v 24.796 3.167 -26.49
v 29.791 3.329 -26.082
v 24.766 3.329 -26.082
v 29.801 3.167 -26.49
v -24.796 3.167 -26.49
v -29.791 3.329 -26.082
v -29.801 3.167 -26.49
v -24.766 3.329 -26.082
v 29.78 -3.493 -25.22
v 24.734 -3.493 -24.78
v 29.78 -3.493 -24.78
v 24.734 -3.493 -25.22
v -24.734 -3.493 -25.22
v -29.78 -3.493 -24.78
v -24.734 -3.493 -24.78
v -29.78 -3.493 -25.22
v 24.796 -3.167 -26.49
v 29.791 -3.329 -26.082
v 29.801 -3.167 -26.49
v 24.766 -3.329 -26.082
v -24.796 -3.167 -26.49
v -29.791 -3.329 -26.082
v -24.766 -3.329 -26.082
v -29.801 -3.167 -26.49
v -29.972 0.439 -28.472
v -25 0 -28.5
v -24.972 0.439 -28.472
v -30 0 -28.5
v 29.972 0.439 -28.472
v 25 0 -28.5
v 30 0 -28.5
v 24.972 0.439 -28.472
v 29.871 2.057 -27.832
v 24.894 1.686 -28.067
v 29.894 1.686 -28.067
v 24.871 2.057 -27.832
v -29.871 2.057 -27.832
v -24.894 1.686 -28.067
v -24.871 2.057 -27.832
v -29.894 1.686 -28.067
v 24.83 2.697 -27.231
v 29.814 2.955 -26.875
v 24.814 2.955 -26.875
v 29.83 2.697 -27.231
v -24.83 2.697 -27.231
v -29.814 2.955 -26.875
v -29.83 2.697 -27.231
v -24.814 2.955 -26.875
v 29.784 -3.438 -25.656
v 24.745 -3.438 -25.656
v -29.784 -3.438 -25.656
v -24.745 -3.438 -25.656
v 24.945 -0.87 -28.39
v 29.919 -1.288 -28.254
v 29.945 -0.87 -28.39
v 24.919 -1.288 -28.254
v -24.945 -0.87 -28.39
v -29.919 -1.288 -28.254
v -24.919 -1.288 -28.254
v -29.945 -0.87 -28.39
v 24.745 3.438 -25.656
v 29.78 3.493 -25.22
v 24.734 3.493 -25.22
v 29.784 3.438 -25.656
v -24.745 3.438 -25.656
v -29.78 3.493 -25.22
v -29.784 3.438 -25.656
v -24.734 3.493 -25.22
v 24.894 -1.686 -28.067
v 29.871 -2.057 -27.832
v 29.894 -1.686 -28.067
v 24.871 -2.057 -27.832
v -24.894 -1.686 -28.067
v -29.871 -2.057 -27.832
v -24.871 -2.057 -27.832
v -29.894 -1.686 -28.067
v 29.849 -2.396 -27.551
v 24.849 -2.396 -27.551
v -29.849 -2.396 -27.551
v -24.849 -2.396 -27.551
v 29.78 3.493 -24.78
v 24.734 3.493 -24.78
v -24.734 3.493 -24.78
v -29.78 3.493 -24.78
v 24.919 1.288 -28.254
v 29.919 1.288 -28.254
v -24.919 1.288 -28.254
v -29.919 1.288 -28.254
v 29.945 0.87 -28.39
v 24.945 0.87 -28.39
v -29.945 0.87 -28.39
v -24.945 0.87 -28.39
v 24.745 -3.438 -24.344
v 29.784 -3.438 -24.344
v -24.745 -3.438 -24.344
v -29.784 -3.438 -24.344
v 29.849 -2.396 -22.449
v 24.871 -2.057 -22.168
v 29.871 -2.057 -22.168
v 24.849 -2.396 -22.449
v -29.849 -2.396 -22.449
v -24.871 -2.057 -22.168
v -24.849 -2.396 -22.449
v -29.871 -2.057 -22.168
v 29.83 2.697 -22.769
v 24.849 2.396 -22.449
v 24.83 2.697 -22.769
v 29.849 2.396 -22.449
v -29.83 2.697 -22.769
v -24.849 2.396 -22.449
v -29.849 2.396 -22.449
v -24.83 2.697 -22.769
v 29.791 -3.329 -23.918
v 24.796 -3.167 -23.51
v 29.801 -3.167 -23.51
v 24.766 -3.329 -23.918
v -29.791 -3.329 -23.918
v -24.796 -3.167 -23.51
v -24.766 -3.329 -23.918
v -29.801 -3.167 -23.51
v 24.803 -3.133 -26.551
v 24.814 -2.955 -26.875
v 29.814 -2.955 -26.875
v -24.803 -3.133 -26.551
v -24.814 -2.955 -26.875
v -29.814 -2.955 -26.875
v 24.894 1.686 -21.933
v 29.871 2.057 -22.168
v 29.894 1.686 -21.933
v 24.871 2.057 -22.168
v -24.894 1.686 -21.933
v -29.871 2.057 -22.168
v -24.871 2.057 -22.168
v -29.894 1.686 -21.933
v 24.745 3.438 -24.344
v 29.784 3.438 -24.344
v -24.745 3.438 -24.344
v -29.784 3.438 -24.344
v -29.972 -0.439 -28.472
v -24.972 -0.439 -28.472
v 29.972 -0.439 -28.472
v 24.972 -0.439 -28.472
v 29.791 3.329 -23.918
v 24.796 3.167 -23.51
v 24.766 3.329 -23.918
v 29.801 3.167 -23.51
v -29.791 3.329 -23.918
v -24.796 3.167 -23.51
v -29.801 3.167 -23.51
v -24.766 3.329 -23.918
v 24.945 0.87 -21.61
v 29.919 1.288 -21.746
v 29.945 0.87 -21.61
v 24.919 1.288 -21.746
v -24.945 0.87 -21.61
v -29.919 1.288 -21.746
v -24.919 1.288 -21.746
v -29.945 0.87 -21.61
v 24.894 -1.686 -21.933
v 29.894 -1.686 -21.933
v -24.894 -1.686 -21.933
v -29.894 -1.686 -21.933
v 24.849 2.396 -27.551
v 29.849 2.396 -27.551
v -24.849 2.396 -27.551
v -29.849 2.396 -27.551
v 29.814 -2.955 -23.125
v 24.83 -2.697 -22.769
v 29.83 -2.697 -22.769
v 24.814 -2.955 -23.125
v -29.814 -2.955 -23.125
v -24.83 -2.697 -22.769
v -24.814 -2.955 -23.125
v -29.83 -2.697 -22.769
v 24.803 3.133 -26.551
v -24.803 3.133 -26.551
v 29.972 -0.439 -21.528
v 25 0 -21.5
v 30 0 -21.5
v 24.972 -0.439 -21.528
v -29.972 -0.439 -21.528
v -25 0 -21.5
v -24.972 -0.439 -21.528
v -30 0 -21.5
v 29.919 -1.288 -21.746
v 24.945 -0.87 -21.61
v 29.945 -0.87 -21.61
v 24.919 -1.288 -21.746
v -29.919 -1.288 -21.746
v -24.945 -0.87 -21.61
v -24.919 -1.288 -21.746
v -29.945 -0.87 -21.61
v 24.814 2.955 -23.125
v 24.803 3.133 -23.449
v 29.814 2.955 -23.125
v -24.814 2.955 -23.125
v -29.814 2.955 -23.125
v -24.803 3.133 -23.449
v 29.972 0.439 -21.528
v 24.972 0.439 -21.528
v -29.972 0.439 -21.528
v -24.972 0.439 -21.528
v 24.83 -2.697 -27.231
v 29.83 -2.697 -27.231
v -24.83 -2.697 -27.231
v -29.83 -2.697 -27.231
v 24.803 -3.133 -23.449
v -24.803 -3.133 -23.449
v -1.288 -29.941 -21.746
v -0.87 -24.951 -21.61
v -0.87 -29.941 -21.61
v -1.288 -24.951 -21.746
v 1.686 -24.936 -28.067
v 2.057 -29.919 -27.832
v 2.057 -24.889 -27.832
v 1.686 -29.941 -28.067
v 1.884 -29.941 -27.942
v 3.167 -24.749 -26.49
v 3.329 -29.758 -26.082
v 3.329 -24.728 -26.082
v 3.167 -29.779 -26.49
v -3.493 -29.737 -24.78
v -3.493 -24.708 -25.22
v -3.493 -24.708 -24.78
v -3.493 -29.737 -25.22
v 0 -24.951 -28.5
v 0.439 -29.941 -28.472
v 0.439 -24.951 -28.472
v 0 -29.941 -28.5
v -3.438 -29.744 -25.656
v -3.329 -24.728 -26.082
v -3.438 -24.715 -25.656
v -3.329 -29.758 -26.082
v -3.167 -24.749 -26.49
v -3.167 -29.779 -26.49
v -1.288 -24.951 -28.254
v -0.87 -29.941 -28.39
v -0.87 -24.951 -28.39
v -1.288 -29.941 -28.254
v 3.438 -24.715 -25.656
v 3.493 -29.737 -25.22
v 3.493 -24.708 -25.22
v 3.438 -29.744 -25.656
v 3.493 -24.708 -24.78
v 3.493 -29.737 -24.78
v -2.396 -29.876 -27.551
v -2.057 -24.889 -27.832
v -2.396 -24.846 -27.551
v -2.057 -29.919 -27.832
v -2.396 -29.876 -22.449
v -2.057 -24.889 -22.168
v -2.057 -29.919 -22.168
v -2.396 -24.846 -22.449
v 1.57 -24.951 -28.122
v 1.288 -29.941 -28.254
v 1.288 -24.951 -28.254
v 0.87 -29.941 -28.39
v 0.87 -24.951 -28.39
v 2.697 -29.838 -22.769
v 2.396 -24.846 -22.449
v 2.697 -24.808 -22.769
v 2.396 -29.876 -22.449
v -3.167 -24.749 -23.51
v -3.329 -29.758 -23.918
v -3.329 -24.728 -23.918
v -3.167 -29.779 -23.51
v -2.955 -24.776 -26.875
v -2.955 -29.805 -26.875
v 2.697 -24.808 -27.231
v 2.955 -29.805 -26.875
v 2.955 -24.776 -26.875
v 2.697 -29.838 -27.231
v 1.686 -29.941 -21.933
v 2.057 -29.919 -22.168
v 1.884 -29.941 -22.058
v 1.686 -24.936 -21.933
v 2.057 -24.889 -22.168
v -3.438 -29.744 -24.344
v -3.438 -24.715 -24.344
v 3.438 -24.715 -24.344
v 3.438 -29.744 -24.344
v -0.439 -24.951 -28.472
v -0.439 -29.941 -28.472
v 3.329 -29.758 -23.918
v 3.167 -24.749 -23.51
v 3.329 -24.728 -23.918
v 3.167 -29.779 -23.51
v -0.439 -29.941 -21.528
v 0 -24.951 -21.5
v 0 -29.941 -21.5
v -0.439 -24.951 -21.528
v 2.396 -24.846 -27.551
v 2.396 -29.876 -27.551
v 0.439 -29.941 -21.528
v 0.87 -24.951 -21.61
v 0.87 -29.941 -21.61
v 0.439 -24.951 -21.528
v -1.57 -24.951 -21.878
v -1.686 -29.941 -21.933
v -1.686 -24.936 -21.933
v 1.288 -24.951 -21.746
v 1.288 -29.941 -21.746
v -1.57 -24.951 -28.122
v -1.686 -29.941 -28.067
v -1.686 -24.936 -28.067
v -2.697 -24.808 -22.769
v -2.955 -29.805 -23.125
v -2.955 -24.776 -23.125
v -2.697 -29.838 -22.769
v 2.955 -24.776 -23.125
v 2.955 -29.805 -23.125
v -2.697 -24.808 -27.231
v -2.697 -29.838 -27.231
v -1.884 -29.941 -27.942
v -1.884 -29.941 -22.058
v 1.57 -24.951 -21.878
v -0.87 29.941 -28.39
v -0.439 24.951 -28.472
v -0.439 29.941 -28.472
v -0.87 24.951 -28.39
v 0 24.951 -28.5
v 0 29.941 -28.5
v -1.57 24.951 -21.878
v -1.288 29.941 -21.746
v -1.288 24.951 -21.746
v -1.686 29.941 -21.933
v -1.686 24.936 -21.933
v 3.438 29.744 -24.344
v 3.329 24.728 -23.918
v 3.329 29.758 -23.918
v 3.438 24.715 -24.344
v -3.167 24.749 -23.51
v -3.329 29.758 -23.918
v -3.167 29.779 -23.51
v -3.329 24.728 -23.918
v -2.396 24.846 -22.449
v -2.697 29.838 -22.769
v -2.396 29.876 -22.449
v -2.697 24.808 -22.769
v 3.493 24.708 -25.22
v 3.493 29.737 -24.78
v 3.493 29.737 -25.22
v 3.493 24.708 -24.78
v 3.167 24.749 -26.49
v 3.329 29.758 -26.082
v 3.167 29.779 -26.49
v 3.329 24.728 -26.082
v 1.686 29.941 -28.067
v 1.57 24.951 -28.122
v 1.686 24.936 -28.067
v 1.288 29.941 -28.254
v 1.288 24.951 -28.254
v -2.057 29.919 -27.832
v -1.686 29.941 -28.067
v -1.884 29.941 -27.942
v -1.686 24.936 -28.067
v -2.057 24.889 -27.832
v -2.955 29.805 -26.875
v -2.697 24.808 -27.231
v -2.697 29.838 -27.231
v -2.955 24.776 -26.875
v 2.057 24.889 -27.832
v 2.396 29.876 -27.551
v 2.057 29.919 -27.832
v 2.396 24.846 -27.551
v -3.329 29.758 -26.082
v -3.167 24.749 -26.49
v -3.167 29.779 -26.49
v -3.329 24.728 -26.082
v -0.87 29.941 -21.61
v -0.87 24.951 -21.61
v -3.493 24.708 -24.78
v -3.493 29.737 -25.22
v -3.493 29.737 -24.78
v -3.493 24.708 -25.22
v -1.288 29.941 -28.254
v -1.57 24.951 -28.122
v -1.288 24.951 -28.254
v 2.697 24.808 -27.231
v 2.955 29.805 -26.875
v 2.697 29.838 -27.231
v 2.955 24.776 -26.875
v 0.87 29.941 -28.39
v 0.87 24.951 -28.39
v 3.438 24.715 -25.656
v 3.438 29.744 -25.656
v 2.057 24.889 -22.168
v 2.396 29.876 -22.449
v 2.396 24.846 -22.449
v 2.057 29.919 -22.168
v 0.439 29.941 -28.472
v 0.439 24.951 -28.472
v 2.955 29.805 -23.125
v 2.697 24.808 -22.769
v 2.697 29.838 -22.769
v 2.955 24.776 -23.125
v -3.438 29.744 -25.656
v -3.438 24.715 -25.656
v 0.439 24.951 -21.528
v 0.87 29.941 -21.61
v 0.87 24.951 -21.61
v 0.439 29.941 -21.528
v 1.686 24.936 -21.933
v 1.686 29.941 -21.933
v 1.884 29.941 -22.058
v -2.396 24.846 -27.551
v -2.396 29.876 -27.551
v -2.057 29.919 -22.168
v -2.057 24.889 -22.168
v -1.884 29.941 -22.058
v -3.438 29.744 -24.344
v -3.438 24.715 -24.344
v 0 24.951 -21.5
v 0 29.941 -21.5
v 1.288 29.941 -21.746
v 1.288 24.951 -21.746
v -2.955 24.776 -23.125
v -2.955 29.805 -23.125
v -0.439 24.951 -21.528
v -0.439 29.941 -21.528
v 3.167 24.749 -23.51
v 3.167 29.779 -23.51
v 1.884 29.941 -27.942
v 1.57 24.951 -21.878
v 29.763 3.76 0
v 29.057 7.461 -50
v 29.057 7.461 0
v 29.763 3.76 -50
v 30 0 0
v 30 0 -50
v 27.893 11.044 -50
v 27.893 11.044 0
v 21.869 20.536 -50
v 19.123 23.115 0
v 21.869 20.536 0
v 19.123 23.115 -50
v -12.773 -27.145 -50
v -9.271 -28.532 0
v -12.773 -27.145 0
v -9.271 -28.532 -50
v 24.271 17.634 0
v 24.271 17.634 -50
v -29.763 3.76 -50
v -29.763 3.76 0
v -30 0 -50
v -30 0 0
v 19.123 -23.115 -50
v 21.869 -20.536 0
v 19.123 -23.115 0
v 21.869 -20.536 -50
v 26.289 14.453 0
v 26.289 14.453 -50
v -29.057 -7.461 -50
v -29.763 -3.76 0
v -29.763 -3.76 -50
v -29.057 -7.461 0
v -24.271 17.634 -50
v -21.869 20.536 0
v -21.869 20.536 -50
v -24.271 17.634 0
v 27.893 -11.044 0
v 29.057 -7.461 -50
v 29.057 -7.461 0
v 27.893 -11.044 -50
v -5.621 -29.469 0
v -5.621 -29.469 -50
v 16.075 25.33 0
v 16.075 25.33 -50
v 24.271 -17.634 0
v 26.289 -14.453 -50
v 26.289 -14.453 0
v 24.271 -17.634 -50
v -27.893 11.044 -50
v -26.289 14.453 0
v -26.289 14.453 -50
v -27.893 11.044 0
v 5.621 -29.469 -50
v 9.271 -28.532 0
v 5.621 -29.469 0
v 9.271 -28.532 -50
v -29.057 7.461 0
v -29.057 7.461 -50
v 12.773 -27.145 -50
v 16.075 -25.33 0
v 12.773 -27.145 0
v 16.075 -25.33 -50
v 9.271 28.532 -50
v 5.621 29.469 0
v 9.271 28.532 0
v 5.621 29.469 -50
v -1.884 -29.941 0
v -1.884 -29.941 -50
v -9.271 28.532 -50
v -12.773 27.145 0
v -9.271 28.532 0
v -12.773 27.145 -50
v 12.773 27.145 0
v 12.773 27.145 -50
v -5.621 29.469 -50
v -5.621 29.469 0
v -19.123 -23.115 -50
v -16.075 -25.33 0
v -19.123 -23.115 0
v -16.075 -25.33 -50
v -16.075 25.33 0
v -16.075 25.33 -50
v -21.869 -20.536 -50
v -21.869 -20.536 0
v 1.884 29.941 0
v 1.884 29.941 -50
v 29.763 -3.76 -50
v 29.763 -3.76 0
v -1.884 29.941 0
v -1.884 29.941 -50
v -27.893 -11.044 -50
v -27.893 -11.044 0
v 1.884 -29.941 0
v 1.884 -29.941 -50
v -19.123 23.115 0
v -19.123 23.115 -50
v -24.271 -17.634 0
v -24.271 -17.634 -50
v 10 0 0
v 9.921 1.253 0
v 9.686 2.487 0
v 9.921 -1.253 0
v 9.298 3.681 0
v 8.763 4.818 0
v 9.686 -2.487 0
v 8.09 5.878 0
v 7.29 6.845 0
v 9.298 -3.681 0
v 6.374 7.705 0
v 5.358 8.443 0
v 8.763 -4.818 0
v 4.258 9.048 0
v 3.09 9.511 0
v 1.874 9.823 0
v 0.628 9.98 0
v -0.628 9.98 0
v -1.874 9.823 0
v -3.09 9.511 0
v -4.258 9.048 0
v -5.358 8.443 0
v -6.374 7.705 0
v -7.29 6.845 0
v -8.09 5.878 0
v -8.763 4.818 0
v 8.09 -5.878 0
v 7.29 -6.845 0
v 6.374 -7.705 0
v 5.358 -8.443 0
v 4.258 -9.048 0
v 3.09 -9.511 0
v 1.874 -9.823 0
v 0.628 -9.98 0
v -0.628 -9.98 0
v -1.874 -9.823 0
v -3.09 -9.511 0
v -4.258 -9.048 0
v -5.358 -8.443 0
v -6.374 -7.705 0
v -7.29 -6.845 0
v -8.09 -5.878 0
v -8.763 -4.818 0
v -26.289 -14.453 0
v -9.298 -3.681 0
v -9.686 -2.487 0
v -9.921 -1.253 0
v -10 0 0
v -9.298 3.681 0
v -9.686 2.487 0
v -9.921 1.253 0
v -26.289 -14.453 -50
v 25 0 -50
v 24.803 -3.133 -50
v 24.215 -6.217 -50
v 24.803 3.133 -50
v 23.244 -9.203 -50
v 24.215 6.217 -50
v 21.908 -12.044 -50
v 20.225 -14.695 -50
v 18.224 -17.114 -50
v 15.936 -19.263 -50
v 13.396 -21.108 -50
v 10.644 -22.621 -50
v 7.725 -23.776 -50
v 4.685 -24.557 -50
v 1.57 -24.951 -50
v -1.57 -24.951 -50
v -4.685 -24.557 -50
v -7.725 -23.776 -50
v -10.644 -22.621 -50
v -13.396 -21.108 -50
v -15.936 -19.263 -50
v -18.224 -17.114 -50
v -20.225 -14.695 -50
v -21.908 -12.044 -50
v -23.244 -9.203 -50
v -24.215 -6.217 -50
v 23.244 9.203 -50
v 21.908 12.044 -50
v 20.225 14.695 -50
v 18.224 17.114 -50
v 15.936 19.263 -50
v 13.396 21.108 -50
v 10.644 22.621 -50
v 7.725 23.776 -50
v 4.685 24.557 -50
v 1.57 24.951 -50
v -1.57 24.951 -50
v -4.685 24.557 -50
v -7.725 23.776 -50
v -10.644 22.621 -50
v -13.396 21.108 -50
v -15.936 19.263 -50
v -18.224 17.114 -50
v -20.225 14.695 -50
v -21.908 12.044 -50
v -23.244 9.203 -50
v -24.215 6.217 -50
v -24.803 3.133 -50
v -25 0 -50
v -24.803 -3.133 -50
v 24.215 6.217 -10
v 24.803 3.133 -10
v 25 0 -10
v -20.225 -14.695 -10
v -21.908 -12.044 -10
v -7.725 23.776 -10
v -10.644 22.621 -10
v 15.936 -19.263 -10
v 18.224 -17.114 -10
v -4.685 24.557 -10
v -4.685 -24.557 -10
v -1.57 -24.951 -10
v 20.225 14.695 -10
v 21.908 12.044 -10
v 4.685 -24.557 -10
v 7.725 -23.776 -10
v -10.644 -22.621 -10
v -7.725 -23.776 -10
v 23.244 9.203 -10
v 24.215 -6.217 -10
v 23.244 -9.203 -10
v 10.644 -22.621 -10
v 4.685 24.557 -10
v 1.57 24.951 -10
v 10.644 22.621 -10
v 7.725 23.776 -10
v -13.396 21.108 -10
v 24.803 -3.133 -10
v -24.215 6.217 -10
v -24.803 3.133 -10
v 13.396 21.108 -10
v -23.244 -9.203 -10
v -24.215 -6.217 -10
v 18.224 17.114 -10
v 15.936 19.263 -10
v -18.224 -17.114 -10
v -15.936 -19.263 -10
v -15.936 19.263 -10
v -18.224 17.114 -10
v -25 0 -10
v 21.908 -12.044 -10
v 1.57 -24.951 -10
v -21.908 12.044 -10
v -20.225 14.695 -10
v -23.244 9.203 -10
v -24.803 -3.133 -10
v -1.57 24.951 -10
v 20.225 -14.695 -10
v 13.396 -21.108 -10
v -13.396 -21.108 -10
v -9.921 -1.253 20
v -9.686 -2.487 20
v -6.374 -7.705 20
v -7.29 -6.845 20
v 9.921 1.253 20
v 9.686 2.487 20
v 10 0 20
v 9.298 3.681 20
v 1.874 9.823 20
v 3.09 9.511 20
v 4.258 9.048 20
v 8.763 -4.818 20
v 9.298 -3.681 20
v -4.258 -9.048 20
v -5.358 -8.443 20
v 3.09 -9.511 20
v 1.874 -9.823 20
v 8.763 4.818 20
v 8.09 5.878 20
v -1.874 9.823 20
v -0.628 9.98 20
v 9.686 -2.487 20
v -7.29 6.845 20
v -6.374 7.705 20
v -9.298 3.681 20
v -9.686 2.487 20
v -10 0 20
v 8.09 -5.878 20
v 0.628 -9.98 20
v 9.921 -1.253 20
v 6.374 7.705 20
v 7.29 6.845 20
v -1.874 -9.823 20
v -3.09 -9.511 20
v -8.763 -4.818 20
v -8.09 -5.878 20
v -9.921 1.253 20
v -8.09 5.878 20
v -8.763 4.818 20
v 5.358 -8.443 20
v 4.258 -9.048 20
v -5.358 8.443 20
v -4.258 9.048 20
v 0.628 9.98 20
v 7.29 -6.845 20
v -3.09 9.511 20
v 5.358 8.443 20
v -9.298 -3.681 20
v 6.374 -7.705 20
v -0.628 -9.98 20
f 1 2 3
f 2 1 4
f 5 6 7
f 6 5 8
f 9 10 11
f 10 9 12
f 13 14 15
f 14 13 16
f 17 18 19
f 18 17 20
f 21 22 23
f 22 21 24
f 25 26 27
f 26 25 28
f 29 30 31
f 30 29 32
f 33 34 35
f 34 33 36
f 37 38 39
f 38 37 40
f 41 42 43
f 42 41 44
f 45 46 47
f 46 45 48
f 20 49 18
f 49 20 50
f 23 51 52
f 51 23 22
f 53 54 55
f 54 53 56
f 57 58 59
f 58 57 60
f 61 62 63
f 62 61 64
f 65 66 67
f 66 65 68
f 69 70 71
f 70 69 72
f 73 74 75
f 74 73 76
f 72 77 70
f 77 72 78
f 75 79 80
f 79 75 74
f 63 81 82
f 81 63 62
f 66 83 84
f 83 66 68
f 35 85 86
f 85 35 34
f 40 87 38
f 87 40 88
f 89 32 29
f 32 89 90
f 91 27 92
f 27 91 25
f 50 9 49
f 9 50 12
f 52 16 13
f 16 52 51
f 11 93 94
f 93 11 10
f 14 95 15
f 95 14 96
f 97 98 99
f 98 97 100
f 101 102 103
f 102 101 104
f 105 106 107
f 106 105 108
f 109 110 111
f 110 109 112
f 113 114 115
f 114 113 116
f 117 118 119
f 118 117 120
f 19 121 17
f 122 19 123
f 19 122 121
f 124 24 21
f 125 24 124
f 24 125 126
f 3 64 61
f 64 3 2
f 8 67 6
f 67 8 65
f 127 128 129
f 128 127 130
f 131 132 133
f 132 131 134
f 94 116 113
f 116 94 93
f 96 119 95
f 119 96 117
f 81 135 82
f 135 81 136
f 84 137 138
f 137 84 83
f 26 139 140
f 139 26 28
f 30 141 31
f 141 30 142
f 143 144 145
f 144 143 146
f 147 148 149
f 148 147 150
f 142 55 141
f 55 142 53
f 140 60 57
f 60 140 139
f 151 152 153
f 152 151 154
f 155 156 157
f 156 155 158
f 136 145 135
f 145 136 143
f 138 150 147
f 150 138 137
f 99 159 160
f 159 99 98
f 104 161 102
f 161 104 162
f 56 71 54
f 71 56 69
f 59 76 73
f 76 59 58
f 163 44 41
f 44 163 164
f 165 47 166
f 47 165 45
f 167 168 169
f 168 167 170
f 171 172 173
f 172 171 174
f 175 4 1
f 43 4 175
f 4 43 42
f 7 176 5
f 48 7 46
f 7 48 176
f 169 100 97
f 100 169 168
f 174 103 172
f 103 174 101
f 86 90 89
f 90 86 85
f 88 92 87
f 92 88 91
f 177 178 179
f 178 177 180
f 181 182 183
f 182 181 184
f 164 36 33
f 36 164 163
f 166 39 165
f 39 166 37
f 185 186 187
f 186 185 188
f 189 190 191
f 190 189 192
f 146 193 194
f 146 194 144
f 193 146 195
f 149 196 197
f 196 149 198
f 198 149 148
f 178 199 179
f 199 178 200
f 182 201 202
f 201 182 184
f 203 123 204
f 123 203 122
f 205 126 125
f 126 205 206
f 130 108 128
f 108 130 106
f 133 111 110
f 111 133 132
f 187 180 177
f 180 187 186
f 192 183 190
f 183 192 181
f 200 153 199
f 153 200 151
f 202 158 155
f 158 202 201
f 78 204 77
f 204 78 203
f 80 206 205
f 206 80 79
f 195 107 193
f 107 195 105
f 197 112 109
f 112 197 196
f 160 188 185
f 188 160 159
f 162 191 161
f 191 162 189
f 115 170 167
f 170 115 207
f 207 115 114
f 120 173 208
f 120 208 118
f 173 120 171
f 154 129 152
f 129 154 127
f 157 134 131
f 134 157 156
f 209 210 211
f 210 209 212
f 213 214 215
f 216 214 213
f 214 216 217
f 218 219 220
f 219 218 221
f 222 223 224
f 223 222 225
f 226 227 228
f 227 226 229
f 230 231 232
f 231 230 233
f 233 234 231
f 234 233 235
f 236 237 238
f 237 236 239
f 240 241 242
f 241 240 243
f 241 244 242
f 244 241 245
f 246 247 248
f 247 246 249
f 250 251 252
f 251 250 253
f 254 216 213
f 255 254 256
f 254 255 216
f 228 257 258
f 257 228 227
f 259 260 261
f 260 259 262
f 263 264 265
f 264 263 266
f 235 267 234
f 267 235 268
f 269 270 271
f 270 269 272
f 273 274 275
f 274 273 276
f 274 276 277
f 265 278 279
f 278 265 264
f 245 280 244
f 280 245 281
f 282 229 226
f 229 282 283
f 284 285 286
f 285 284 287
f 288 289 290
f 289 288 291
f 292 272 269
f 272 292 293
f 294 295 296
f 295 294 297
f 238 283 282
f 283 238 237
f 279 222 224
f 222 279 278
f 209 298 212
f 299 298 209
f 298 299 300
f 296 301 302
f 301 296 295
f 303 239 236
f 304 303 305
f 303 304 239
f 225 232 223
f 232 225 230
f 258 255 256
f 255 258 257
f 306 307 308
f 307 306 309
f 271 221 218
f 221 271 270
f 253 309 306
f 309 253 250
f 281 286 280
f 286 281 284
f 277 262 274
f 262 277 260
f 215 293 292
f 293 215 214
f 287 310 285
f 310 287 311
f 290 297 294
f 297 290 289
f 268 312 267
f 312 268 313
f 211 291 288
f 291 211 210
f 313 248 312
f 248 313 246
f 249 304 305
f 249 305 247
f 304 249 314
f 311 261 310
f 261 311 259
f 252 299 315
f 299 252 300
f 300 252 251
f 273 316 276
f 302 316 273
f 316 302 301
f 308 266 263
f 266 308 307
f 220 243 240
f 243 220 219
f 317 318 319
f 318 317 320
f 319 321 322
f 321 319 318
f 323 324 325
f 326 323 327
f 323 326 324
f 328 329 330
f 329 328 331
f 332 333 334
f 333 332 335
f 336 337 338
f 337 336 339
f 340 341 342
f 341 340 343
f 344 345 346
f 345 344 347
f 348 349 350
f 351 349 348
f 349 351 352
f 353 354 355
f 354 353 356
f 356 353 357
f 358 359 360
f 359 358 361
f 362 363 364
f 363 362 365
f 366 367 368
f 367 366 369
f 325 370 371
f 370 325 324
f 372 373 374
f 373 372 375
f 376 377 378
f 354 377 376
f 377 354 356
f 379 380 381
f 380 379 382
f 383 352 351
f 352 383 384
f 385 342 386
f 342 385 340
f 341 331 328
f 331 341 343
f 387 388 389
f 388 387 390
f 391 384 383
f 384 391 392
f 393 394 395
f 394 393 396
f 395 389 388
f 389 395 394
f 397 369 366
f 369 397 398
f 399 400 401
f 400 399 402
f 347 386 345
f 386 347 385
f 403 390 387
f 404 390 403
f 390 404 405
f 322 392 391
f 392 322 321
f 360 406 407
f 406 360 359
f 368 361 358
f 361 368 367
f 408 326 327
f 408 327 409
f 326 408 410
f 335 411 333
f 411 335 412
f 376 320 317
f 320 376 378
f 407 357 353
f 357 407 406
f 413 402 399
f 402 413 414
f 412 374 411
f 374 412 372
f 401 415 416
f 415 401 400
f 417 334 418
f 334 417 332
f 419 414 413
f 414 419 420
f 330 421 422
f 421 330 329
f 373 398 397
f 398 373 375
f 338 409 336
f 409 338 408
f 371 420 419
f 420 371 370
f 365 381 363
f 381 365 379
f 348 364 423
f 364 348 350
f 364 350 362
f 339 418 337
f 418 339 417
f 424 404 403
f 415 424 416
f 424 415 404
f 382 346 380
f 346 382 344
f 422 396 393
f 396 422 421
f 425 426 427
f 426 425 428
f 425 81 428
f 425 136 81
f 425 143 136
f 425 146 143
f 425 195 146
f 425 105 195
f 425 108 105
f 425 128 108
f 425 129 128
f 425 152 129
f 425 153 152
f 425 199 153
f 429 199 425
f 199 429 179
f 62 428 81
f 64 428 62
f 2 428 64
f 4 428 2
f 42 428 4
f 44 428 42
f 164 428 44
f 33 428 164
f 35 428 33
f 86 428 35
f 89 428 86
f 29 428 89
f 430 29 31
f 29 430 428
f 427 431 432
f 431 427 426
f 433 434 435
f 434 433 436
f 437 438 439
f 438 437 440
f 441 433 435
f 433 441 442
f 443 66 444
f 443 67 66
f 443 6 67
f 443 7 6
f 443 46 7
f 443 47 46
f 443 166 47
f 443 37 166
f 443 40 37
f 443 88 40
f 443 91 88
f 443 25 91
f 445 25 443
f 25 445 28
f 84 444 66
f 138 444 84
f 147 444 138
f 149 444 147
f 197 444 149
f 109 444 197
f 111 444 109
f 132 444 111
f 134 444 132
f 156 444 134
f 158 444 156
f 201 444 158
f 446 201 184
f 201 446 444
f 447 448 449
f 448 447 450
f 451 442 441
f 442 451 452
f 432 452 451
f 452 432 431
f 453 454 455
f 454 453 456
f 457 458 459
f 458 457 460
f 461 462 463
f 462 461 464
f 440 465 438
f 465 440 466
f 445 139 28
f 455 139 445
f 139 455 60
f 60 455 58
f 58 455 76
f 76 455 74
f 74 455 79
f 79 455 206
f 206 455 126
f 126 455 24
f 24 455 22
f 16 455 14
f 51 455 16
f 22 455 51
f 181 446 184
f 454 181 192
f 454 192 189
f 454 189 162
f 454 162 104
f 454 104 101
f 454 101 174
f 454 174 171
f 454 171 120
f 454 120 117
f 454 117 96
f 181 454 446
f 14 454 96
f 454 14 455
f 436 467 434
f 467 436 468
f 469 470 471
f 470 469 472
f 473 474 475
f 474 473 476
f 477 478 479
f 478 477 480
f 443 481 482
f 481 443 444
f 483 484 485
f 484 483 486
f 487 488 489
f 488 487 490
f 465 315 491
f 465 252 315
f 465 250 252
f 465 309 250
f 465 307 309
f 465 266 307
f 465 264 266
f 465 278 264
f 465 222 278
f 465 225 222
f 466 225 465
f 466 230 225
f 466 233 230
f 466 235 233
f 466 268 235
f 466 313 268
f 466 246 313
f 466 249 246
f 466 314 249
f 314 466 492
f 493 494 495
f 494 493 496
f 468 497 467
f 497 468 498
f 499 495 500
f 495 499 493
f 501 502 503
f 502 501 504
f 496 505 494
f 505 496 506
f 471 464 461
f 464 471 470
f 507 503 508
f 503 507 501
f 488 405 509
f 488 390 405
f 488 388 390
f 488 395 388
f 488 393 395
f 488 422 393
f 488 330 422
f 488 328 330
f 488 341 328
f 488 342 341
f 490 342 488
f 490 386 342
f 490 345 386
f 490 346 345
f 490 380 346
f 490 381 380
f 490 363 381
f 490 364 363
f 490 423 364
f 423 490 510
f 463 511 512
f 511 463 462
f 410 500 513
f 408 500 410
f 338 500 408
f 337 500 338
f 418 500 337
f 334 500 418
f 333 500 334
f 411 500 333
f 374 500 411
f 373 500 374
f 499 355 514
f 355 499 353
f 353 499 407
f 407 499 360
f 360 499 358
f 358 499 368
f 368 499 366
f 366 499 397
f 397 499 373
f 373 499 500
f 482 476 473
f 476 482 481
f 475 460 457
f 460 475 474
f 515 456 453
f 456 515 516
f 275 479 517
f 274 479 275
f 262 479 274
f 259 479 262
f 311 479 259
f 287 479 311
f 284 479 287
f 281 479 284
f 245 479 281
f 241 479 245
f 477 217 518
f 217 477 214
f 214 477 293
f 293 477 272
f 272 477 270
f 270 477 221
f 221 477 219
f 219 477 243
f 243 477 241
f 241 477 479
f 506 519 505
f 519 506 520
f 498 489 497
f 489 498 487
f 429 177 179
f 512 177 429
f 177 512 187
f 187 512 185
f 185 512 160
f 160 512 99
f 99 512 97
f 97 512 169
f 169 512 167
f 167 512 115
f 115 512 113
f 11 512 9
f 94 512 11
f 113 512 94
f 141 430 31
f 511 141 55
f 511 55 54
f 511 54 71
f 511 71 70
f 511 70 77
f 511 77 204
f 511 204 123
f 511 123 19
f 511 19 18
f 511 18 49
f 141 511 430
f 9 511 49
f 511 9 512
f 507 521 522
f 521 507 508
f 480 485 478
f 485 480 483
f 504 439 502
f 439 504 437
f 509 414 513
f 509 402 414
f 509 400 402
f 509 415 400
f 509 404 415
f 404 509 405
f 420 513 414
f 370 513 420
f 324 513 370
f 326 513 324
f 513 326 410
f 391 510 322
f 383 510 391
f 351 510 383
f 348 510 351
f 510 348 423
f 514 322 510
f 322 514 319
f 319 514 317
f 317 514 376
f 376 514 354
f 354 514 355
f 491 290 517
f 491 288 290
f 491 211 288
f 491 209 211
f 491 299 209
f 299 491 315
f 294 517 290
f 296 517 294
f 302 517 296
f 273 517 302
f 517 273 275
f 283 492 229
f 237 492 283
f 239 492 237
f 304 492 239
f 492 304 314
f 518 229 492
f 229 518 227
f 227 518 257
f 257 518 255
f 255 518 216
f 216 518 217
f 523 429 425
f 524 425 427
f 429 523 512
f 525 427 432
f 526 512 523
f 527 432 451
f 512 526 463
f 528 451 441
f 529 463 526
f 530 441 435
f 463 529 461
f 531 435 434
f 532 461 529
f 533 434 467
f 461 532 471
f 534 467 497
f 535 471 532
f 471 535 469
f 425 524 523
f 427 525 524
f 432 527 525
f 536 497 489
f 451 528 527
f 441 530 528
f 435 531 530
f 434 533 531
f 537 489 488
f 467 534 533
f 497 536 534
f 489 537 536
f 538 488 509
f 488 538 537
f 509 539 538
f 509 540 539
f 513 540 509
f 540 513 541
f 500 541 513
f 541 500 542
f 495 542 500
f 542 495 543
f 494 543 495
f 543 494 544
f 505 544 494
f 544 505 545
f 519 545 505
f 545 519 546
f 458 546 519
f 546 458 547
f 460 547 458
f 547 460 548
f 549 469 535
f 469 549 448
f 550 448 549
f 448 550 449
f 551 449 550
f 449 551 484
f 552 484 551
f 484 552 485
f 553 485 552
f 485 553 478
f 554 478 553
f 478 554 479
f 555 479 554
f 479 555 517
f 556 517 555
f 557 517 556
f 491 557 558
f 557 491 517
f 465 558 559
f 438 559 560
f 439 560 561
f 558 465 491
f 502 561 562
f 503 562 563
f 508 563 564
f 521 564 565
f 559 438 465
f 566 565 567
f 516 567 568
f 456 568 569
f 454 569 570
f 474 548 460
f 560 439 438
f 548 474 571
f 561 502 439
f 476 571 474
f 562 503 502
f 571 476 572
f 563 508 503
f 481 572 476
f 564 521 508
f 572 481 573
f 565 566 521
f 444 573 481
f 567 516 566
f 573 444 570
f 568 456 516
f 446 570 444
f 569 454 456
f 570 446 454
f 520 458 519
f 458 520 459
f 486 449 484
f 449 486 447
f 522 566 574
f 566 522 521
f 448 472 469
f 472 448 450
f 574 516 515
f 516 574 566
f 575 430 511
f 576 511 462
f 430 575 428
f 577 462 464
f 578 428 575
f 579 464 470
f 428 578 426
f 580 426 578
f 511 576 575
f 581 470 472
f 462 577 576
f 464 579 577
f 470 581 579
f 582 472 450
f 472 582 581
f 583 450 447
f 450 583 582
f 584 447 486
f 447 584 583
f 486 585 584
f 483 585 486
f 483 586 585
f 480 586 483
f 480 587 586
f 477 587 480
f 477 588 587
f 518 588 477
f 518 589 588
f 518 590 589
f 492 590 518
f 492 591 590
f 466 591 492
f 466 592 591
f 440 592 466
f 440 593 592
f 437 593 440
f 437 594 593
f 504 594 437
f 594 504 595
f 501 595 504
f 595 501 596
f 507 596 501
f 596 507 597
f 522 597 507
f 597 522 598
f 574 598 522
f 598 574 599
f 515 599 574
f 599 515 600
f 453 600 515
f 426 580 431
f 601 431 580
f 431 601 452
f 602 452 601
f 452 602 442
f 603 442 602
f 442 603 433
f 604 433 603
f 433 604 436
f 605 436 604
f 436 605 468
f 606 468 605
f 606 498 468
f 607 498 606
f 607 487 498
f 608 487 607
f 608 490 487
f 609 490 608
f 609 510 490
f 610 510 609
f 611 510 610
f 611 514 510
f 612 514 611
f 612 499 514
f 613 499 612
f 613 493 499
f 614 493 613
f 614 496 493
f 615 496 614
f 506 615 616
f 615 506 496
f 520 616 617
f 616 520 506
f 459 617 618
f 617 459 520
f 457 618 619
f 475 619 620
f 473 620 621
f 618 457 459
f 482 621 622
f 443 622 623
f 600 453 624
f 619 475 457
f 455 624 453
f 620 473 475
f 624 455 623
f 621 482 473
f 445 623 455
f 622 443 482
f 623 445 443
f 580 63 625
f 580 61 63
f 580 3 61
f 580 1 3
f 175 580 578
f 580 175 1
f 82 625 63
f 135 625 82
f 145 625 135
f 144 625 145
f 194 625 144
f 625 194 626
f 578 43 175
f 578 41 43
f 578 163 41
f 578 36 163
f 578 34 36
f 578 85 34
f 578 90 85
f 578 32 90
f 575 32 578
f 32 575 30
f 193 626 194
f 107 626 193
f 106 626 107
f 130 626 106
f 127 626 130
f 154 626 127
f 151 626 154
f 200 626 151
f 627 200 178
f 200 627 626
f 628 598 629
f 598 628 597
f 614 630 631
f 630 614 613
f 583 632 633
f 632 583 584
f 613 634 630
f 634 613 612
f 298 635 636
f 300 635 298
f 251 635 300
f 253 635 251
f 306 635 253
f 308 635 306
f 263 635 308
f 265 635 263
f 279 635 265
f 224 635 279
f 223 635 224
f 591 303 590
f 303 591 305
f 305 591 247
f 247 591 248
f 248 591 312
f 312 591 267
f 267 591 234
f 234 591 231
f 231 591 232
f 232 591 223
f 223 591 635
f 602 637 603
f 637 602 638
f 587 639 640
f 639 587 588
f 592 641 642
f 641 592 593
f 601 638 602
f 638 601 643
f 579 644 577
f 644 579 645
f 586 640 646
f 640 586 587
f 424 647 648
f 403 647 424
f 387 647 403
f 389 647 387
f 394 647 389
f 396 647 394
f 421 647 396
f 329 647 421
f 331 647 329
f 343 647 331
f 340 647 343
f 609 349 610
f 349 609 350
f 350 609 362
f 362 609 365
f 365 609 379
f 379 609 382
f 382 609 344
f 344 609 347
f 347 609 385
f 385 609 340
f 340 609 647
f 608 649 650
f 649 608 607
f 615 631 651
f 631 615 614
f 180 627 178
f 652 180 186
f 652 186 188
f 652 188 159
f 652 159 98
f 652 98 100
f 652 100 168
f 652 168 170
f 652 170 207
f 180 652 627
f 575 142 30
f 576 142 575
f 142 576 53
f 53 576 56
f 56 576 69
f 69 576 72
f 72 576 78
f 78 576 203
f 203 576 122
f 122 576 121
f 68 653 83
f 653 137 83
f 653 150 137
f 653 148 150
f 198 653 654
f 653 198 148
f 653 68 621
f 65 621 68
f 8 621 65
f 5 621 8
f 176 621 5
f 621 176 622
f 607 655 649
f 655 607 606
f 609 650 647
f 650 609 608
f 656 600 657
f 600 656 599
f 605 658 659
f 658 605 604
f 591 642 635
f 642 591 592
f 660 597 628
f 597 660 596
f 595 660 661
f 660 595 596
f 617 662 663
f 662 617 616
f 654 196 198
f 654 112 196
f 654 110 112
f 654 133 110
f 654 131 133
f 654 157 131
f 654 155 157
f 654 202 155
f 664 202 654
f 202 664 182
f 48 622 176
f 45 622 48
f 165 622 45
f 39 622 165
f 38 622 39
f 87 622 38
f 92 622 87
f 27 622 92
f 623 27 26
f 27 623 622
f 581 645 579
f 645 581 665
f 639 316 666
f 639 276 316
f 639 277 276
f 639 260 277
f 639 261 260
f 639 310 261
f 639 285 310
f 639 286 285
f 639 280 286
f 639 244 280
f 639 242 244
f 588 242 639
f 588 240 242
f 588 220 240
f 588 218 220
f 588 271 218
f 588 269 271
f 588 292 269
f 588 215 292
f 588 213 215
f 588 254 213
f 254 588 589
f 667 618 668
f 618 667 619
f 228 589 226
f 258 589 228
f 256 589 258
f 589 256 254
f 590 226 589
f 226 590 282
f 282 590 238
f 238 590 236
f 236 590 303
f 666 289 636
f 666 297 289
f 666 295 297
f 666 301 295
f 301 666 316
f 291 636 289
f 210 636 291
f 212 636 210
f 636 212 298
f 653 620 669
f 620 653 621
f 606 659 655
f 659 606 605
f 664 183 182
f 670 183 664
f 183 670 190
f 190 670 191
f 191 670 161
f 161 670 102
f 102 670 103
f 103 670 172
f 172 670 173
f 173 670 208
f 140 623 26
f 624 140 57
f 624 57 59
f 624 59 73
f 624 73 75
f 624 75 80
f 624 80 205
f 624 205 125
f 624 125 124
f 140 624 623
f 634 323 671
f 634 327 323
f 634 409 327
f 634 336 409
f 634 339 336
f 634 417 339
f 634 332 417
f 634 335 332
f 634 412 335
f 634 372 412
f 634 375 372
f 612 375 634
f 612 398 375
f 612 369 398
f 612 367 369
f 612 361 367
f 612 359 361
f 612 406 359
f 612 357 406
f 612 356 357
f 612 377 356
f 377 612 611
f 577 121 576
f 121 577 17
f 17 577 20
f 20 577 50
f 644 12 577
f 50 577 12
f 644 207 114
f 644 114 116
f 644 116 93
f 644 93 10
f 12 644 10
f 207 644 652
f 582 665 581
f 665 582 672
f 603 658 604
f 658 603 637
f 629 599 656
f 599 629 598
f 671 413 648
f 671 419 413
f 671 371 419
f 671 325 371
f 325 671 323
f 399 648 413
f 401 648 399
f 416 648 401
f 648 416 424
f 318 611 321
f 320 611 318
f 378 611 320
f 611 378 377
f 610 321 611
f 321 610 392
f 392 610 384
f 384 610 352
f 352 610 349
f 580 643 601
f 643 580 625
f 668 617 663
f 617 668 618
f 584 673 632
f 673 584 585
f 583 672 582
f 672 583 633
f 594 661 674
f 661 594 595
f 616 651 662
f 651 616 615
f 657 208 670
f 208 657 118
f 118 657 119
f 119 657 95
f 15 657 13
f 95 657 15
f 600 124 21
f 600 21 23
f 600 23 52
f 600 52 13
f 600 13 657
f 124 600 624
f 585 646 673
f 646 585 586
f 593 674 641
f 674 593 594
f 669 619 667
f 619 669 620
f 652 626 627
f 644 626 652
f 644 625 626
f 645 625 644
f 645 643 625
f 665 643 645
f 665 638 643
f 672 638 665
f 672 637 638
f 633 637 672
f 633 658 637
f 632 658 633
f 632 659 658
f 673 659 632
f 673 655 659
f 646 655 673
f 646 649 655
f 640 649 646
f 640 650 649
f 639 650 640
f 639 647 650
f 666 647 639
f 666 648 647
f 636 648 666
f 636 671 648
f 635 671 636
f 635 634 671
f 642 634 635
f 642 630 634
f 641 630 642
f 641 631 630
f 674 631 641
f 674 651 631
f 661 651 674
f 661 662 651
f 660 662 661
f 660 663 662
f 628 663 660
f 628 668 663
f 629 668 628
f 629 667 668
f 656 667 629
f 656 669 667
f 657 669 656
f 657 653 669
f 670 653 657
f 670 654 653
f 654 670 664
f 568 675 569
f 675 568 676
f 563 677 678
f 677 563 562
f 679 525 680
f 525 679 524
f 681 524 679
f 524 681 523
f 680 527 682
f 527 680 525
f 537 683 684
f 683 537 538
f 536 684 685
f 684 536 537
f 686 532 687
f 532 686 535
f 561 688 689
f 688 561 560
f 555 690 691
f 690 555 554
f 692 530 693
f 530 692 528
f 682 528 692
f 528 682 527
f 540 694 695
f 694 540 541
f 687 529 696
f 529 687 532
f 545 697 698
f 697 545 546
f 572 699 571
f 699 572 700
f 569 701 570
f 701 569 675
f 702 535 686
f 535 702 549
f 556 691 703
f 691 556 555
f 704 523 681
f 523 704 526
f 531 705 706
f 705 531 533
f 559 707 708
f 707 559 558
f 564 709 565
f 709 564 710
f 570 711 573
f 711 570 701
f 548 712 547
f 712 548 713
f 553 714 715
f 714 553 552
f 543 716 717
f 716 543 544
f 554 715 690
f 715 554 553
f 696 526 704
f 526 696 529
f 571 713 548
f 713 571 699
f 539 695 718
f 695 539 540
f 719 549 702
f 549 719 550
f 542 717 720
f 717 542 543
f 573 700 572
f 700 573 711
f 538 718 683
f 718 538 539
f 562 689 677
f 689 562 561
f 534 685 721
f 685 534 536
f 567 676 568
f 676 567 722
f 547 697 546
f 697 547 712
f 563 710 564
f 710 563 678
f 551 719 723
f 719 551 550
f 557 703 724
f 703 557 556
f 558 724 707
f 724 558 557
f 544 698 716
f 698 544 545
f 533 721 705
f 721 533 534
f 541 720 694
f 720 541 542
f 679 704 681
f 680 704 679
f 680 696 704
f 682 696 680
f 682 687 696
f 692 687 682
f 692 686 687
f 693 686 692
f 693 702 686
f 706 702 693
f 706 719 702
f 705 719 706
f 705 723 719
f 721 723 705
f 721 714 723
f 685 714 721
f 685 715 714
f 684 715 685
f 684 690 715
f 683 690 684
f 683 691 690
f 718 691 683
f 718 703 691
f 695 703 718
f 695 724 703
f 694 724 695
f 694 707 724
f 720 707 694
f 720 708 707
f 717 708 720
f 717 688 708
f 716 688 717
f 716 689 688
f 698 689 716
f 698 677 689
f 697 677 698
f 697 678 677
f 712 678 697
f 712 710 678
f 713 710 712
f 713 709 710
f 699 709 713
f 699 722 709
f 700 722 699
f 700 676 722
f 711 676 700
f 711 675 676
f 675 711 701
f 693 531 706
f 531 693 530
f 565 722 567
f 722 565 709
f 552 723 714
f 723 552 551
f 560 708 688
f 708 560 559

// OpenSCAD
/*NON self centering chuck Feb 2016 Glyn Cowles */
// diameter of grip
hd=20;
// grip height
ht=20; 
//outside diameter of chuck
cdo=60;
// inside diameter of chuck
cdi=50;
// chuck height
ch=50; 
// diam of screw holes
hold=7; 
// number of screw holes
nsh=4; 

$fn=50;
assemble();



//-------------------------------------------------
module assemble() {
    grip();     
    translate([0,0,-ch]) chuck();     
}
 
//-------------------------------------------------
module grip() { 
     cylinder(d=hd,h=ht);
}
//-------------------------------------------------
module chuck() {
    n=cdo-cdi;
    difference() {
     cylinder(d=cdo,h=ch);
     cylinder(d=cdi,h=ch-n);
     #translate([0,0,cdi/2]) holes();
    }    
}
//-------------------------------------------------
module holes() {
    p=360/nsh;
    for (i=[0:nsh-1]) {
        rotate([i*p,90,0]) cylinder(h=cdo/2,d=hold);   
    }
}
//-------------------------------------------------
